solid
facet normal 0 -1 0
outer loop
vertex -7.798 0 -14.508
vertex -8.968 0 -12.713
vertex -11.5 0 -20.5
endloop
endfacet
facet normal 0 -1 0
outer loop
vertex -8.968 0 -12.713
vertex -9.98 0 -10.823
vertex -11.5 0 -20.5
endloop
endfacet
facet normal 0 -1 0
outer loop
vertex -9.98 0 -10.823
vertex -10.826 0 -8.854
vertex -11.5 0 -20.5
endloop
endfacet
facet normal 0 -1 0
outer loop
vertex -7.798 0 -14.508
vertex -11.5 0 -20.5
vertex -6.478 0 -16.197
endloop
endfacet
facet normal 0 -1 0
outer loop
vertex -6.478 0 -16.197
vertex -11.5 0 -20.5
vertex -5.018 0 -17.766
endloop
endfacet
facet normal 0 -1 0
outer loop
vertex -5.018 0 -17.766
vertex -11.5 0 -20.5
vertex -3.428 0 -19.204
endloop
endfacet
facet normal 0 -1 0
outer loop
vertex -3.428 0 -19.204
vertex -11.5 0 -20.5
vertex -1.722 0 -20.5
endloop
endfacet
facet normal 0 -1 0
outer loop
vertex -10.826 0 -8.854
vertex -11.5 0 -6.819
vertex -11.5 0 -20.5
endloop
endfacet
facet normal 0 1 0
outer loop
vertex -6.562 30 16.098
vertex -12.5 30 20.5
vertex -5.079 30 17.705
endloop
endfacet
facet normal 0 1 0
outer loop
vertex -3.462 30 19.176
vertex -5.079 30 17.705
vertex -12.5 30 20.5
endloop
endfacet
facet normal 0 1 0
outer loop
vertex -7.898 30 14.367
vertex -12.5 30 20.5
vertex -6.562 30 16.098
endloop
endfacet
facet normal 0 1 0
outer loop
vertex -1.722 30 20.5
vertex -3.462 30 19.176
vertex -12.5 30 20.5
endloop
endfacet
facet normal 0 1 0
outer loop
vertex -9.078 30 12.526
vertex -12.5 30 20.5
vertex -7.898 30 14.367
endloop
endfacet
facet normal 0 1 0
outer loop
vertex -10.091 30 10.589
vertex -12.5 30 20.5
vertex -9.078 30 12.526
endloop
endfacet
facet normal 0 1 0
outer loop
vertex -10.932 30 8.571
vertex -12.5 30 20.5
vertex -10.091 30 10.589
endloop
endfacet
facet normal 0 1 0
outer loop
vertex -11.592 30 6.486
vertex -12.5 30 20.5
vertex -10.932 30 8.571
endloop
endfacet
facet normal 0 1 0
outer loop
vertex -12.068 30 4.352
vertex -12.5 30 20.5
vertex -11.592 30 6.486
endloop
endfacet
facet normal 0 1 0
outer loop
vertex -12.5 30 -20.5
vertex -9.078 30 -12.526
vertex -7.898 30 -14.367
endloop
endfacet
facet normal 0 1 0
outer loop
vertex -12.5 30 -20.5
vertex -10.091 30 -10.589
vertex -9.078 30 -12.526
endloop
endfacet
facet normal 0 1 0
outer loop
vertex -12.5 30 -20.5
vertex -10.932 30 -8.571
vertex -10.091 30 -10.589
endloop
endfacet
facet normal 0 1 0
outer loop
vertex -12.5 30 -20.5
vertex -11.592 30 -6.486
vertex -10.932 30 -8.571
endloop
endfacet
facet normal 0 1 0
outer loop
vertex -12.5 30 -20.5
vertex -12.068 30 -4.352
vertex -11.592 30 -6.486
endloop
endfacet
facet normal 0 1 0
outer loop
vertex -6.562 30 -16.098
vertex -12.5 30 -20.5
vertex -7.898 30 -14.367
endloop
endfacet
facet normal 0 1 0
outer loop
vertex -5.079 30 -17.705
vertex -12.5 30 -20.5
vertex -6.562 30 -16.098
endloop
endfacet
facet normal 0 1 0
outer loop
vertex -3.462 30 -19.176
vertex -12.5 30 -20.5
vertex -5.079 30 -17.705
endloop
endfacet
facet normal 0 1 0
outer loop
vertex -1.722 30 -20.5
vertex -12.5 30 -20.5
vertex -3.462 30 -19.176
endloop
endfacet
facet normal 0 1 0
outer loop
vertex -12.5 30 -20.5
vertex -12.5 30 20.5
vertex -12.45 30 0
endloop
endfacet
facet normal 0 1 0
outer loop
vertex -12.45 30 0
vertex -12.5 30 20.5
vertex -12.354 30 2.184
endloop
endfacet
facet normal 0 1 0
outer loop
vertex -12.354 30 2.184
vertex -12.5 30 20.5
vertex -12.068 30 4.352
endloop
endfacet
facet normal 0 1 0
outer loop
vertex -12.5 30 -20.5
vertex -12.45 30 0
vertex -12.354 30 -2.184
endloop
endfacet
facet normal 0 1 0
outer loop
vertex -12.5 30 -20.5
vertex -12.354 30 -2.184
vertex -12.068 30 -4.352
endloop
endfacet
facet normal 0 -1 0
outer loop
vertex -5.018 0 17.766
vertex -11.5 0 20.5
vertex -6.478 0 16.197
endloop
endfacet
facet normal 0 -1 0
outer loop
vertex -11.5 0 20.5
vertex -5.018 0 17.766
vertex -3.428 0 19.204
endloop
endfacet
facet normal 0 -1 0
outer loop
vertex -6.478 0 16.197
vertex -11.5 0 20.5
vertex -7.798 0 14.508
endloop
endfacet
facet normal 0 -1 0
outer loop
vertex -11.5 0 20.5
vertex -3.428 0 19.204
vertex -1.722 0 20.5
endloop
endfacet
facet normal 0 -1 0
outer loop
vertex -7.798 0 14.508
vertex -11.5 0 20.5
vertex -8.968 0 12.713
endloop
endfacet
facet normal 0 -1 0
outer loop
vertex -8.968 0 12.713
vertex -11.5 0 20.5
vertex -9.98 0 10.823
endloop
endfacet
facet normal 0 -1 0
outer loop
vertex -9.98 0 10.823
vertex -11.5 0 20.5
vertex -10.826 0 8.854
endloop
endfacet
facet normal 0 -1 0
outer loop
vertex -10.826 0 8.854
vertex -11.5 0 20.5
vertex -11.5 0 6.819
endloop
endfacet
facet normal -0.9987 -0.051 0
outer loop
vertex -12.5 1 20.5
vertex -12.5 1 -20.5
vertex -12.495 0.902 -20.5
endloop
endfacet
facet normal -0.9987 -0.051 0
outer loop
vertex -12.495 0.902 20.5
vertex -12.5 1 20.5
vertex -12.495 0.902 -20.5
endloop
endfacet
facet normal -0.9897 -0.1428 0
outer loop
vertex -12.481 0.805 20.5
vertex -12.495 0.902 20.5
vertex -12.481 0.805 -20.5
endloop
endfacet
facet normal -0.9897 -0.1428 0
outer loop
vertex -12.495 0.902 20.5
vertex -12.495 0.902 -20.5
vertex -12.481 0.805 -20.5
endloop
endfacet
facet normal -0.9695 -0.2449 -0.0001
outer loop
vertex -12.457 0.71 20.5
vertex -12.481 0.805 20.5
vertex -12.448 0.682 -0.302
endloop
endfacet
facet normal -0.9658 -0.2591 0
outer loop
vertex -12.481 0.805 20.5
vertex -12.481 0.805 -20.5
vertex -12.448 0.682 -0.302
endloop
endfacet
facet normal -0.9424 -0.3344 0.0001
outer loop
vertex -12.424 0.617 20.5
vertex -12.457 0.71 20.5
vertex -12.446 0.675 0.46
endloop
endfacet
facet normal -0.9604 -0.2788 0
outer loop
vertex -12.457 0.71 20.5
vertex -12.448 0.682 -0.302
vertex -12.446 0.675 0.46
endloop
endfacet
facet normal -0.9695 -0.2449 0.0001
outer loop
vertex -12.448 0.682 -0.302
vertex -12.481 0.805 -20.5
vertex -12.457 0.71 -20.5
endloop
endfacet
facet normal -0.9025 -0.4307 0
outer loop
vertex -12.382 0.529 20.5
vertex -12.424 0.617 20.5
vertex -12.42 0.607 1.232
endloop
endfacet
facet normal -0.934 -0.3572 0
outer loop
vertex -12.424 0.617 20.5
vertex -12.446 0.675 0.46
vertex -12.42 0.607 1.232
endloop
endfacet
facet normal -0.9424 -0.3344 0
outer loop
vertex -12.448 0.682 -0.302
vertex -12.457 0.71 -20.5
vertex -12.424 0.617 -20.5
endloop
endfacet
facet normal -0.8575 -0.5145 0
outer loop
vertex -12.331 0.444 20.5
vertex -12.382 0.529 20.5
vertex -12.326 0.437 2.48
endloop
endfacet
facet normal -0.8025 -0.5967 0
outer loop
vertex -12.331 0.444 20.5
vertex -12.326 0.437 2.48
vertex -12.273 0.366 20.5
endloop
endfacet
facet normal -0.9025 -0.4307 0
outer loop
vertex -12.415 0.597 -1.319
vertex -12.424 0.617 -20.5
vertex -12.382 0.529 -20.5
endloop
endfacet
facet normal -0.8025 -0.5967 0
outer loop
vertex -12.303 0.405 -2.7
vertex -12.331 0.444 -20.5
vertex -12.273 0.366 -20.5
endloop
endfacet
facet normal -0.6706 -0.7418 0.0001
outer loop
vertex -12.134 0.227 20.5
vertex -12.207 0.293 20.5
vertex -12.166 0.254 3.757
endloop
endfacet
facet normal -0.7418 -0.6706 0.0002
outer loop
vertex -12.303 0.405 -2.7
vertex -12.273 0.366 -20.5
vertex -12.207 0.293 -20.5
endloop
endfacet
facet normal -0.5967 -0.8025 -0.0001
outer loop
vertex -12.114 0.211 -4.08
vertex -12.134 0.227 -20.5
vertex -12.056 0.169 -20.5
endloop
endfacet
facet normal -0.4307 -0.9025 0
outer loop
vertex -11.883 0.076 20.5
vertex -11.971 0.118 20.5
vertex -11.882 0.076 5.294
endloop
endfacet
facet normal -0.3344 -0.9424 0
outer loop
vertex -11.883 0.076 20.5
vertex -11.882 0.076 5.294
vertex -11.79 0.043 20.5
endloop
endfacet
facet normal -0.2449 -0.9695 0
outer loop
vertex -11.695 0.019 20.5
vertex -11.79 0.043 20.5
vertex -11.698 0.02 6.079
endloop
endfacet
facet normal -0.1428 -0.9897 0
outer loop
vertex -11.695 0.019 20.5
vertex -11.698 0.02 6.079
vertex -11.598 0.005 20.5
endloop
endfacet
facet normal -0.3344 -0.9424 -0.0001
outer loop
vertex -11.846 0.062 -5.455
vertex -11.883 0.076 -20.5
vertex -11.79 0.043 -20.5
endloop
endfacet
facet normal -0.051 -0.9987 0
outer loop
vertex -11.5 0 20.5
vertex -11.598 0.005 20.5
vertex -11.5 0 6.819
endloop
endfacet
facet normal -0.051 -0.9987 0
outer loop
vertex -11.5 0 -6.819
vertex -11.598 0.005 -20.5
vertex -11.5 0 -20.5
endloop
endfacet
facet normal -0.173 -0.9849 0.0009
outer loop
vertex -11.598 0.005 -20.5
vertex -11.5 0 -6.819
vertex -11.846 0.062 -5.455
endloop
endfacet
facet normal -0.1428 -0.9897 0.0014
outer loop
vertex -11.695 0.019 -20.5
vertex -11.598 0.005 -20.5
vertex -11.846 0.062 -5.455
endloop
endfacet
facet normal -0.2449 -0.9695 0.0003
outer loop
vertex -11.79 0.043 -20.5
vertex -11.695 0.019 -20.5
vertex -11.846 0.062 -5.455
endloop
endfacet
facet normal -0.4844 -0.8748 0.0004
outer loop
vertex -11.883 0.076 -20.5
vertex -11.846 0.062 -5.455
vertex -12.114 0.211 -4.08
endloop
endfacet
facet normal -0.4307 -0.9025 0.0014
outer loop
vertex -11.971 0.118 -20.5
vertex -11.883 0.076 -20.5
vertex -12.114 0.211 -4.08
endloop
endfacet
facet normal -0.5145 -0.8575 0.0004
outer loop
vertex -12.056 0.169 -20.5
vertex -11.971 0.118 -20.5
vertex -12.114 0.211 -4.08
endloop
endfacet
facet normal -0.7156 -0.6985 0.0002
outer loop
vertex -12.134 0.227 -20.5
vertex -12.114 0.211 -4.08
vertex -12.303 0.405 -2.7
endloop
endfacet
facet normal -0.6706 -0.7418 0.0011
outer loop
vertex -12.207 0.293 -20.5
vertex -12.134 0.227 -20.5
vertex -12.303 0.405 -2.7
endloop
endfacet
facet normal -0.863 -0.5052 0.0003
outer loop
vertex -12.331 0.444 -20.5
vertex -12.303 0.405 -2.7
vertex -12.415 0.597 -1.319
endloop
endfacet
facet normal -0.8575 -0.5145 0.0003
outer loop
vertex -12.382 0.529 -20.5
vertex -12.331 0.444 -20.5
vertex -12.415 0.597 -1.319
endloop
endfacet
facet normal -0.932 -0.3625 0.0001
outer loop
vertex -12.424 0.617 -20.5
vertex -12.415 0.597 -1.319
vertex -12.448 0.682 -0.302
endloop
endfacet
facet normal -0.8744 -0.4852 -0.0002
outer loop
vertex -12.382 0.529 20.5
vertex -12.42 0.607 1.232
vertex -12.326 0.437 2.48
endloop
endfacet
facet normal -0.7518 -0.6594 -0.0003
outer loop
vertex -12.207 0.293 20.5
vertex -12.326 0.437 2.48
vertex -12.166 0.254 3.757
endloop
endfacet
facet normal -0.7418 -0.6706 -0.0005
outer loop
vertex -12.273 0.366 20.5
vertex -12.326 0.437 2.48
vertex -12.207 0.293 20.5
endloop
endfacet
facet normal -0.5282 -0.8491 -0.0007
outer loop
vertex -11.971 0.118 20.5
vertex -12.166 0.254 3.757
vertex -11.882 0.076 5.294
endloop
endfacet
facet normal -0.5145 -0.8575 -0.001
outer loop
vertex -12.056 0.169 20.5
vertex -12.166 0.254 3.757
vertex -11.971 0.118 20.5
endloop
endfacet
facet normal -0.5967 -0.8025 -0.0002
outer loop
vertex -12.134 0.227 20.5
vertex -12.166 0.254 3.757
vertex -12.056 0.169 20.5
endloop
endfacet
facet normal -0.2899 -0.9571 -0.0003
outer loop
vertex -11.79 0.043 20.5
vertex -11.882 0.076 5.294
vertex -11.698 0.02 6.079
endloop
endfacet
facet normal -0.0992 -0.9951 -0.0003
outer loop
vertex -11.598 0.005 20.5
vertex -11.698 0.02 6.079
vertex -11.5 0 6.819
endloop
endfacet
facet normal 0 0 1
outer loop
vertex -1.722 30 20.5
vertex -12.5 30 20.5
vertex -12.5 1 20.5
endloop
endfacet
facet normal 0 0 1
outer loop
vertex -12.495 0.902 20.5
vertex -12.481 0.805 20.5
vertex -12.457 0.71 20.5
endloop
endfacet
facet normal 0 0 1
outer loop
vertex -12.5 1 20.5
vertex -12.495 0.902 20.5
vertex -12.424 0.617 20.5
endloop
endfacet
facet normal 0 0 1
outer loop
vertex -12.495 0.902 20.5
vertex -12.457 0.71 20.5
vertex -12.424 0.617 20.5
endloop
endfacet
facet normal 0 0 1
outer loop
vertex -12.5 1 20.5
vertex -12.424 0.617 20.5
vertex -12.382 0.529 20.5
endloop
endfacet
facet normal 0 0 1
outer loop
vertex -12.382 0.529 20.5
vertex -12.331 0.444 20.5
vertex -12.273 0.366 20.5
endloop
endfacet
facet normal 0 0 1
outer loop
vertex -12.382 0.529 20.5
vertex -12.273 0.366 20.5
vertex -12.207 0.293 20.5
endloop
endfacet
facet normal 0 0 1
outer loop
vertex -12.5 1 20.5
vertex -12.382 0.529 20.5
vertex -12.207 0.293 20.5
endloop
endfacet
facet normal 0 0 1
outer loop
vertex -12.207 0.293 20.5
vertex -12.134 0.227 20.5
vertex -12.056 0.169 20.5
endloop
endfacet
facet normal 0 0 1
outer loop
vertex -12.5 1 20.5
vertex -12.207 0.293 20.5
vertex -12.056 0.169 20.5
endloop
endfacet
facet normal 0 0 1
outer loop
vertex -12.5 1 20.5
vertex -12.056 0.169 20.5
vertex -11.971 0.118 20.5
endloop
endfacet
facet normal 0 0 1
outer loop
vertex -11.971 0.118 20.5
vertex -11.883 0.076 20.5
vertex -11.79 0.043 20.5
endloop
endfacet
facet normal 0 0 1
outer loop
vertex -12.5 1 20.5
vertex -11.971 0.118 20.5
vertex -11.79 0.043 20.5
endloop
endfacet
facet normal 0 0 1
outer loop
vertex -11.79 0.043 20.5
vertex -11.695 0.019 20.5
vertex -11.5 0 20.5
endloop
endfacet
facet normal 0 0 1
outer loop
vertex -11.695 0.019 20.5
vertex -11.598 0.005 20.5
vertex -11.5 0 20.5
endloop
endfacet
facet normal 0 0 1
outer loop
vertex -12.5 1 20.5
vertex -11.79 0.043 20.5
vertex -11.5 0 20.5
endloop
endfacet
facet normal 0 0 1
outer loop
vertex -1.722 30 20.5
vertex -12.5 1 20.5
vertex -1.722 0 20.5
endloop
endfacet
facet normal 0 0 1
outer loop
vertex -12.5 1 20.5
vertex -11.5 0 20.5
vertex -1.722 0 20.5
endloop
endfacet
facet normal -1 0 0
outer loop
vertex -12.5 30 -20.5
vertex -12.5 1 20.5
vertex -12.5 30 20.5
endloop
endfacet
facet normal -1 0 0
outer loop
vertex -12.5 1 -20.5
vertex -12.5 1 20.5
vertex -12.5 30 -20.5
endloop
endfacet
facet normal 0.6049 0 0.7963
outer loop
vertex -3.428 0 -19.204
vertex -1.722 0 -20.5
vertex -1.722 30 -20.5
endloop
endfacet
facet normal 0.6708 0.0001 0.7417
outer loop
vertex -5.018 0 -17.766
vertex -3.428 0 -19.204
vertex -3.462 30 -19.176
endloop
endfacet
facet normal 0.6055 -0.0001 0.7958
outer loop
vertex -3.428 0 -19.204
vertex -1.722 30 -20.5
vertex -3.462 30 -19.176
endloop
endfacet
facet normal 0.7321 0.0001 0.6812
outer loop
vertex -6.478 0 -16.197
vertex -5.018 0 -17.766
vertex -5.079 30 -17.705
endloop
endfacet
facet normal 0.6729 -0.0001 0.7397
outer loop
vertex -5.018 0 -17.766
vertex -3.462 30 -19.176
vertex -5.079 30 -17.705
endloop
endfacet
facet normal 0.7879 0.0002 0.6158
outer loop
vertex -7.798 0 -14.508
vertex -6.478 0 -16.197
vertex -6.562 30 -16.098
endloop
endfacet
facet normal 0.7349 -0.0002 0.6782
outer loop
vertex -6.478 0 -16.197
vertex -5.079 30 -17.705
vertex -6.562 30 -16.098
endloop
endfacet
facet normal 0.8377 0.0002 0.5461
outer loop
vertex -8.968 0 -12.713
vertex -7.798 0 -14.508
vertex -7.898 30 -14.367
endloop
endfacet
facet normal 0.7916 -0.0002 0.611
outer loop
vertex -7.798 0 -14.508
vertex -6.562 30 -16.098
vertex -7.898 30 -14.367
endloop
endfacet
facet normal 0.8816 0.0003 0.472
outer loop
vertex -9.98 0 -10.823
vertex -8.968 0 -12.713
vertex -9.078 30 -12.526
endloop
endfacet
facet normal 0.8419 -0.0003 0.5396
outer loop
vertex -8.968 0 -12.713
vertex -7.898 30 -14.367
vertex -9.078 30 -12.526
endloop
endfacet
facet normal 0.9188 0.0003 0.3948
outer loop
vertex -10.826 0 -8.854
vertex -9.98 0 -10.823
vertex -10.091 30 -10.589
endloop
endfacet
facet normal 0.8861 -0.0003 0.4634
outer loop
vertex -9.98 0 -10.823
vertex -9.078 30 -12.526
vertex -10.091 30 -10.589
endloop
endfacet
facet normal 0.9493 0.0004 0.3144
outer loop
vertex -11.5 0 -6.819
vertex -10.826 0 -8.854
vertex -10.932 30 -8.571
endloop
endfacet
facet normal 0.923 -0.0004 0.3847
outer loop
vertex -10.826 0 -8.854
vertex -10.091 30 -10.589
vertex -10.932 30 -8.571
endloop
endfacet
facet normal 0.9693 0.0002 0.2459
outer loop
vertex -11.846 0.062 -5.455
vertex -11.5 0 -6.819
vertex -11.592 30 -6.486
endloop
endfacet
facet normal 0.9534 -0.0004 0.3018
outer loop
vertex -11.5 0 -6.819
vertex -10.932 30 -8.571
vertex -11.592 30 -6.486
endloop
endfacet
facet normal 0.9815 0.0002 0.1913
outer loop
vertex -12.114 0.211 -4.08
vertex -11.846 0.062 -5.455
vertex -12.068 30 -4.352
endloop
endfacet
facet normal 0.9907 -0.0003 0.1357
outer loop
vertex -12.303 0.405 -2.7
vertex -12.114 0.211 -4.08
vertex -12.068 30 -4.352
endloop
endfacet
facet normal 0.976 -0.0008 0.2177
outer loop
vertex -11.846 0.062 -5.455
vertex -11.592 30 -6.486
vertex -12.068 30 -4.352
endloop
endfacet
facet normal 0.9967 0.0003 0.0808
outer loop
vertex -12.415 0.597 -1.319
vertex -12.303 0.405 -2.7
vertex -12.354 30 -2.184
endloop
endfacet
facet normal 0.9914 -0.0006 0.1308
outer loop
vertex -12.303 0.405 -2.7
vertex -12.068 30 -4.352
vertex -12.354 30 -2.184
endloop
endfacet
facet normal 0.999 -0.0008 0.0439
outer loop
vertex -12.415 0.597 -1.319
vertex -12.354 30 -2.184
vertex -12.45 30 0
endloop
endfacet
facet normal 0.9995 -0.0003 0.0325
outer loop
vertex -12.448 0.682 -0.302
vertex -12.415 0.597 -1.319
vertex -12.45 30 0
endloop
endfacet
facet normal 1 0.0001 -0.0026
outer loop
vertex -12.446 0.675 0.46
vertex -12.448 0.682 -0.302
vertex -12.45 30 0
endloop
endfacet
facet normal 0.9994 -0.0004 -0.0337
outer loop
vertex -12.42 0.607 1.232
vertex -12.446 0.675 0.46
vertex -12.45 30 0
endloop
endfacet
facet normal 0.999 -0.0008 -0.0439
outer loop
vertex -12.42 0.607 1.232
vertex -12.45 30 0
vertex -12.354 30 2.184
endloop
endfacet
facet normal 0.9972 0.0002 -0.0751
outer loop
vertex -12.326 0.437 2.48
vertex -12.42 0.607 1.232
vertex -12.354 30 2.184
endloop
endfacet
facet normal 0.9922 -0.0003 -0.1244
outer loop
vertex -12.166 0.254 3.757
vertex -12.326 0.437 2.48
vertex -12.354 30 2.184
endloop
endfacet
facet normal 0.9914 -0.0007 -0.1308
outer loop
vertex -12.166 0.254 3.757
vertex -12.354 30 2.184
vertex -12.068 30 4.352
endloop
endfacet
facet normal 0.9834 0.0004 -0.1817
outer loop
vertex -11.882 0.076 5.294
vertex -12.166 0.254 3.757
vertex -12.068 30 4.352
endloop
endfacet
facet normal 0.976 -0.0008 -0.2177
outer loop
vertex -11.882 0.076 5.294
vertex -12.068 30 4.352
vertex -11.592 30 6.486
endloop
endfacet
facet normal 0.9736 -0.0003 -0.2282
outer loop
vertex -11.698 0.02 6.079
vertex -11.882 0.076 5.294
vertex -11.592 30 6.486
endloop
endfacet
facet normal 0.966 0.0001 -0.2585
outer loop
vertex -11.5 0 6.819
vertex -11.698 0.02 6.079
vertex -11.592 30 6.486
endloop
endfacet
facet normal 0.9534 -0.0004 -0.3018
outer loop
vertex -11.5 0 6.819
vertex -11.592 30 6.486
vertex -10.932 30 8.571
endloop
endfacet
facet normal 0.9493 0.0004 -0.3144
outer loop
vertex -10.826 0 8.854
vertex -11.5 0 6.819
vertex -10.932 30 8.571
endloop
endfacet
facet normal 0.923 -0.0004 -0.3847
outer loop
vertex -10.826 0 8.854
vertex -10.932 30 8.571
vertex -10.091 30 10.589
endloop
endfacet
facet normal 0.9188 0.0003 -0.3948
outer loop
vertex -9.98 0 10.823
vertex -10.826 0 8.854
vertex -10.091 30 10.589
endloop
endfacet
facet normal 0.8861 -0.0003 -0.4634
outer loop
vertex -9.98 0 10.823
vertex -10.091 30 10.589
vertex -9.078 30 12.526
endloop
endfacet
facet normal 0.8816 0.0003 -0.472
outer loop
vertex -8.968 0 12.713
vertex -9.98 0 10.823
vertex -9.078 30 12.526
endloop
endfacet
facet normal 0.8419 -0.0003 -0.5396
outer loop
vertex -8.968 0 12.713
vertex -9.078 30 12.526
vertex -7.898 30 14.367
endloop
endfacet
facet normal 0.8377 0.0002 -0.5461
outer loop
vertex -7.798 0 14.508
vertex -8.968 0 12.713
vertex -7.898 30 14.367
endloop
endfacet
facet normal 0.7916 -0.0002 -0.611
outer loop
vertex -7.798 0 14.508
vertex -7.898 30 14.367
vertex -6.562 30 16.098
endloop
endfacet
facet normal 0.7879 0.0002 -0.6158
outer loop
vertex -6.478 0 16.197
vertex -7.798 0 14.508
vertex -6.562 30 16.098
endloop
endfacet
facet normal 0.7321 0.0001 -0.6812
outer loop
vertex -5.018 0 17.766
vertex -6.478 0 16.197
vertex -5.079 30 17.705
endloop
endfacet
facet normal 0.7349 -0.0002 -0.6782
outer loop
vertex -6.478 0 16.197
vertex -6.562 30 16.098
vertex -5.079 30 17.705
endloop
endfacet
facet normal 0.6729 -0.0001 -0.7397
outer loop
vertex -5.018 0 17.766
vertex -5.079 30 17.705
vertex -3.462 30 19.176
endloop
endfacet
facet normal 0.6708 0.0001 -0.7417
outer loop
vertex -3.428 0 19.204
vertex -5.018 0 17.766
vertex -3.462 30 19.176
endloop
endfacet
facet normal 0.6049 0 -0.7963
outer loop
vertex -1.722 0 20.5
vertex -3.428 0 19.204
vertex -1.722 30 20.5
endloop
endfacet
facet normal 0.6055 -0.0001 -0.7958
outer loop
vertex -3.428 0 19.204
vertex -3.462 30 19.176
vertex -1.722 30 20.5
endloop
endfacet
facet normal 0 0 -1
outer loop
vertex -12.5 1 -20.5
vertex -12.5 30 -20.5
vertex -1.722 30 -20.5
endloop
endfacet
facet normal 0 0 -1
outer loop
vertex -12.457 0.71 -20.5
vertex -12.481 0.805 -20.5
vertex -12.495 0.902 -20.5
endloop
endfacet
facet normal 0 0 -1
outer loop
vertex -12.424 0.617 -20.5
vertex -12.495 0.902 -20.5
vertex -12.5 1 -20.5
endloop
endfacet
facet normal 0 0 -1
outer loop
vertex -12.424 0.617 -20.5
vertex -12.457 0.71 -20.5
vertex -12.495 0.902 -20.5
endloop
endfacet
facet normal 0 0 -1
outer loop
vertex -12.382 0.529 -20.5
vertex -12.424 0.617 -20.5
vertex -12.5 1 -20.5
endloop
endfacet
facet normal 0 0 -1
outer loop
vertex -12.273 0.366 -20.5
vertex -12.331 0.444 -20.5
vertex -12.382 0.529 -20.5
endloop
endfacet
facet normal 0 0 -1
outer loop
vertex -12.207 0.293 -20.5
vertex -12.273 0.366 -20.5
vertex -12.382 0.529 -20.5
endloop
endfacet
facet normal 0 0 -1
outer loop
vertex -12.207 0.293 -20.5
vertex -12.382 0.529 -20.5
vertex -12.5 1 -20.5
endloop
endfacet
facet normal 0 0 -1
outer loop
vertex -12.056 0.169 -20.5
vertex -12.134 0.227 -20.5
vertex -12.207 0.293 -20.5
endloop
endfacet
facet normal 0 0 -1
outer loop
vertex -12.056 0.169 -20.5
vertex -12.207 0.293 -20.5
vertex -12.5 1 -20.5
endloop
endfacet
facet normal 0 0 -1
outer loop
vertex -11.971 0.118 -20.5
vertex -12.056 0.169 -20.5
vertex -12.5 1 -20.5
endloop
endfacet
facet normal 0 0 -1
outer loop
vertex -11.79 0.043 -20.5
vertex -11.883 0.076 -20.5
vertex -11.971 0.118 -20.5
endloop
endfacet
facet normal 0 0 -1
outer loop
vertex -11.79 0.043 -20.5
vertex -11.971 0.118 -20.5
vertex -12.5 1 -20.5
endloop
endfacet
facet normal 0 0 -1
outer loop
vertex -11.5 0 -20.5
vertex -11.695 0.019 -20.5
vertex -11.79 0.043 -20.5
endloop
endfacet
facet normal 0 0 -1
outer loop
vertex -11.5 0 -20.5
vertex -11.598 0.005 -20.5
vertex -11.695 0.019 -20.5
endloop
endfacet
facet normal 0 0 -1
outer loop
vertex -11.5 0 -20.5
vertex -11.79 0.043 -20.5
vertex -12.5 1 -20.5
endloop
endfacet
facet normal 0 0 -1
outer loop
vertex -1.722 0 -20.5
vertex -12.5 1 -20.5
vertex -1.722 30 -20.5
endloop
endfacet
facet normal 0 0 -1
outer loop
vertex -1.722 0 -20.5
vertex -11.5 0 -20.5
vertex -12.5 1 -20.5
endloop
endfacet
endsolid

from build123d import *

# Parameters (mm, degrees)
SKETCH_1_W          = 25
SKETCH_1_H          = 41
EXTRUDE_1_DEPTH     = 30
FILLET_1_R          = 1
SKETCH_2_R          = 24.95
CUT_EXTRUDE_1_DEPTH = 30


with BuildPart() as part:
    # Эскиз1 → Бобышка-Вытянуть1 (new body)
    with BuildSketch(Plane(origin=(0, 0, 0), x_dir=(1, 0, 0), z_dir=(0, 1, 0))):
        Rectangle(SKETCH_1_W, SKETCH_1_H)
    extrude(amount=EXTRUDE_1_DEPTH)

    # Скругление1
    fillet_1_edges = [part.edges().sort_by_distance(p)[0] for p in [
        (-12.5, 0, 0),
    ]]
    fillet(fillet_1_edges, radius=FILLET_1_R)

    # Эскиз2 → Вырез-Вытянуть1 (cut)
    with BuildSketch(Plane(origin=(0, 30, 0), x_dir=(1, 0, 0), z_dir=(0, 1, 0))):
        with Locations((12.5, 0)):
            Circle(SKETCH_2_R)
    extrude(amount=-CUT_EXTRUDE_1_DEPTH, mode=Mode.SUBTRACT)


solid = part.part
